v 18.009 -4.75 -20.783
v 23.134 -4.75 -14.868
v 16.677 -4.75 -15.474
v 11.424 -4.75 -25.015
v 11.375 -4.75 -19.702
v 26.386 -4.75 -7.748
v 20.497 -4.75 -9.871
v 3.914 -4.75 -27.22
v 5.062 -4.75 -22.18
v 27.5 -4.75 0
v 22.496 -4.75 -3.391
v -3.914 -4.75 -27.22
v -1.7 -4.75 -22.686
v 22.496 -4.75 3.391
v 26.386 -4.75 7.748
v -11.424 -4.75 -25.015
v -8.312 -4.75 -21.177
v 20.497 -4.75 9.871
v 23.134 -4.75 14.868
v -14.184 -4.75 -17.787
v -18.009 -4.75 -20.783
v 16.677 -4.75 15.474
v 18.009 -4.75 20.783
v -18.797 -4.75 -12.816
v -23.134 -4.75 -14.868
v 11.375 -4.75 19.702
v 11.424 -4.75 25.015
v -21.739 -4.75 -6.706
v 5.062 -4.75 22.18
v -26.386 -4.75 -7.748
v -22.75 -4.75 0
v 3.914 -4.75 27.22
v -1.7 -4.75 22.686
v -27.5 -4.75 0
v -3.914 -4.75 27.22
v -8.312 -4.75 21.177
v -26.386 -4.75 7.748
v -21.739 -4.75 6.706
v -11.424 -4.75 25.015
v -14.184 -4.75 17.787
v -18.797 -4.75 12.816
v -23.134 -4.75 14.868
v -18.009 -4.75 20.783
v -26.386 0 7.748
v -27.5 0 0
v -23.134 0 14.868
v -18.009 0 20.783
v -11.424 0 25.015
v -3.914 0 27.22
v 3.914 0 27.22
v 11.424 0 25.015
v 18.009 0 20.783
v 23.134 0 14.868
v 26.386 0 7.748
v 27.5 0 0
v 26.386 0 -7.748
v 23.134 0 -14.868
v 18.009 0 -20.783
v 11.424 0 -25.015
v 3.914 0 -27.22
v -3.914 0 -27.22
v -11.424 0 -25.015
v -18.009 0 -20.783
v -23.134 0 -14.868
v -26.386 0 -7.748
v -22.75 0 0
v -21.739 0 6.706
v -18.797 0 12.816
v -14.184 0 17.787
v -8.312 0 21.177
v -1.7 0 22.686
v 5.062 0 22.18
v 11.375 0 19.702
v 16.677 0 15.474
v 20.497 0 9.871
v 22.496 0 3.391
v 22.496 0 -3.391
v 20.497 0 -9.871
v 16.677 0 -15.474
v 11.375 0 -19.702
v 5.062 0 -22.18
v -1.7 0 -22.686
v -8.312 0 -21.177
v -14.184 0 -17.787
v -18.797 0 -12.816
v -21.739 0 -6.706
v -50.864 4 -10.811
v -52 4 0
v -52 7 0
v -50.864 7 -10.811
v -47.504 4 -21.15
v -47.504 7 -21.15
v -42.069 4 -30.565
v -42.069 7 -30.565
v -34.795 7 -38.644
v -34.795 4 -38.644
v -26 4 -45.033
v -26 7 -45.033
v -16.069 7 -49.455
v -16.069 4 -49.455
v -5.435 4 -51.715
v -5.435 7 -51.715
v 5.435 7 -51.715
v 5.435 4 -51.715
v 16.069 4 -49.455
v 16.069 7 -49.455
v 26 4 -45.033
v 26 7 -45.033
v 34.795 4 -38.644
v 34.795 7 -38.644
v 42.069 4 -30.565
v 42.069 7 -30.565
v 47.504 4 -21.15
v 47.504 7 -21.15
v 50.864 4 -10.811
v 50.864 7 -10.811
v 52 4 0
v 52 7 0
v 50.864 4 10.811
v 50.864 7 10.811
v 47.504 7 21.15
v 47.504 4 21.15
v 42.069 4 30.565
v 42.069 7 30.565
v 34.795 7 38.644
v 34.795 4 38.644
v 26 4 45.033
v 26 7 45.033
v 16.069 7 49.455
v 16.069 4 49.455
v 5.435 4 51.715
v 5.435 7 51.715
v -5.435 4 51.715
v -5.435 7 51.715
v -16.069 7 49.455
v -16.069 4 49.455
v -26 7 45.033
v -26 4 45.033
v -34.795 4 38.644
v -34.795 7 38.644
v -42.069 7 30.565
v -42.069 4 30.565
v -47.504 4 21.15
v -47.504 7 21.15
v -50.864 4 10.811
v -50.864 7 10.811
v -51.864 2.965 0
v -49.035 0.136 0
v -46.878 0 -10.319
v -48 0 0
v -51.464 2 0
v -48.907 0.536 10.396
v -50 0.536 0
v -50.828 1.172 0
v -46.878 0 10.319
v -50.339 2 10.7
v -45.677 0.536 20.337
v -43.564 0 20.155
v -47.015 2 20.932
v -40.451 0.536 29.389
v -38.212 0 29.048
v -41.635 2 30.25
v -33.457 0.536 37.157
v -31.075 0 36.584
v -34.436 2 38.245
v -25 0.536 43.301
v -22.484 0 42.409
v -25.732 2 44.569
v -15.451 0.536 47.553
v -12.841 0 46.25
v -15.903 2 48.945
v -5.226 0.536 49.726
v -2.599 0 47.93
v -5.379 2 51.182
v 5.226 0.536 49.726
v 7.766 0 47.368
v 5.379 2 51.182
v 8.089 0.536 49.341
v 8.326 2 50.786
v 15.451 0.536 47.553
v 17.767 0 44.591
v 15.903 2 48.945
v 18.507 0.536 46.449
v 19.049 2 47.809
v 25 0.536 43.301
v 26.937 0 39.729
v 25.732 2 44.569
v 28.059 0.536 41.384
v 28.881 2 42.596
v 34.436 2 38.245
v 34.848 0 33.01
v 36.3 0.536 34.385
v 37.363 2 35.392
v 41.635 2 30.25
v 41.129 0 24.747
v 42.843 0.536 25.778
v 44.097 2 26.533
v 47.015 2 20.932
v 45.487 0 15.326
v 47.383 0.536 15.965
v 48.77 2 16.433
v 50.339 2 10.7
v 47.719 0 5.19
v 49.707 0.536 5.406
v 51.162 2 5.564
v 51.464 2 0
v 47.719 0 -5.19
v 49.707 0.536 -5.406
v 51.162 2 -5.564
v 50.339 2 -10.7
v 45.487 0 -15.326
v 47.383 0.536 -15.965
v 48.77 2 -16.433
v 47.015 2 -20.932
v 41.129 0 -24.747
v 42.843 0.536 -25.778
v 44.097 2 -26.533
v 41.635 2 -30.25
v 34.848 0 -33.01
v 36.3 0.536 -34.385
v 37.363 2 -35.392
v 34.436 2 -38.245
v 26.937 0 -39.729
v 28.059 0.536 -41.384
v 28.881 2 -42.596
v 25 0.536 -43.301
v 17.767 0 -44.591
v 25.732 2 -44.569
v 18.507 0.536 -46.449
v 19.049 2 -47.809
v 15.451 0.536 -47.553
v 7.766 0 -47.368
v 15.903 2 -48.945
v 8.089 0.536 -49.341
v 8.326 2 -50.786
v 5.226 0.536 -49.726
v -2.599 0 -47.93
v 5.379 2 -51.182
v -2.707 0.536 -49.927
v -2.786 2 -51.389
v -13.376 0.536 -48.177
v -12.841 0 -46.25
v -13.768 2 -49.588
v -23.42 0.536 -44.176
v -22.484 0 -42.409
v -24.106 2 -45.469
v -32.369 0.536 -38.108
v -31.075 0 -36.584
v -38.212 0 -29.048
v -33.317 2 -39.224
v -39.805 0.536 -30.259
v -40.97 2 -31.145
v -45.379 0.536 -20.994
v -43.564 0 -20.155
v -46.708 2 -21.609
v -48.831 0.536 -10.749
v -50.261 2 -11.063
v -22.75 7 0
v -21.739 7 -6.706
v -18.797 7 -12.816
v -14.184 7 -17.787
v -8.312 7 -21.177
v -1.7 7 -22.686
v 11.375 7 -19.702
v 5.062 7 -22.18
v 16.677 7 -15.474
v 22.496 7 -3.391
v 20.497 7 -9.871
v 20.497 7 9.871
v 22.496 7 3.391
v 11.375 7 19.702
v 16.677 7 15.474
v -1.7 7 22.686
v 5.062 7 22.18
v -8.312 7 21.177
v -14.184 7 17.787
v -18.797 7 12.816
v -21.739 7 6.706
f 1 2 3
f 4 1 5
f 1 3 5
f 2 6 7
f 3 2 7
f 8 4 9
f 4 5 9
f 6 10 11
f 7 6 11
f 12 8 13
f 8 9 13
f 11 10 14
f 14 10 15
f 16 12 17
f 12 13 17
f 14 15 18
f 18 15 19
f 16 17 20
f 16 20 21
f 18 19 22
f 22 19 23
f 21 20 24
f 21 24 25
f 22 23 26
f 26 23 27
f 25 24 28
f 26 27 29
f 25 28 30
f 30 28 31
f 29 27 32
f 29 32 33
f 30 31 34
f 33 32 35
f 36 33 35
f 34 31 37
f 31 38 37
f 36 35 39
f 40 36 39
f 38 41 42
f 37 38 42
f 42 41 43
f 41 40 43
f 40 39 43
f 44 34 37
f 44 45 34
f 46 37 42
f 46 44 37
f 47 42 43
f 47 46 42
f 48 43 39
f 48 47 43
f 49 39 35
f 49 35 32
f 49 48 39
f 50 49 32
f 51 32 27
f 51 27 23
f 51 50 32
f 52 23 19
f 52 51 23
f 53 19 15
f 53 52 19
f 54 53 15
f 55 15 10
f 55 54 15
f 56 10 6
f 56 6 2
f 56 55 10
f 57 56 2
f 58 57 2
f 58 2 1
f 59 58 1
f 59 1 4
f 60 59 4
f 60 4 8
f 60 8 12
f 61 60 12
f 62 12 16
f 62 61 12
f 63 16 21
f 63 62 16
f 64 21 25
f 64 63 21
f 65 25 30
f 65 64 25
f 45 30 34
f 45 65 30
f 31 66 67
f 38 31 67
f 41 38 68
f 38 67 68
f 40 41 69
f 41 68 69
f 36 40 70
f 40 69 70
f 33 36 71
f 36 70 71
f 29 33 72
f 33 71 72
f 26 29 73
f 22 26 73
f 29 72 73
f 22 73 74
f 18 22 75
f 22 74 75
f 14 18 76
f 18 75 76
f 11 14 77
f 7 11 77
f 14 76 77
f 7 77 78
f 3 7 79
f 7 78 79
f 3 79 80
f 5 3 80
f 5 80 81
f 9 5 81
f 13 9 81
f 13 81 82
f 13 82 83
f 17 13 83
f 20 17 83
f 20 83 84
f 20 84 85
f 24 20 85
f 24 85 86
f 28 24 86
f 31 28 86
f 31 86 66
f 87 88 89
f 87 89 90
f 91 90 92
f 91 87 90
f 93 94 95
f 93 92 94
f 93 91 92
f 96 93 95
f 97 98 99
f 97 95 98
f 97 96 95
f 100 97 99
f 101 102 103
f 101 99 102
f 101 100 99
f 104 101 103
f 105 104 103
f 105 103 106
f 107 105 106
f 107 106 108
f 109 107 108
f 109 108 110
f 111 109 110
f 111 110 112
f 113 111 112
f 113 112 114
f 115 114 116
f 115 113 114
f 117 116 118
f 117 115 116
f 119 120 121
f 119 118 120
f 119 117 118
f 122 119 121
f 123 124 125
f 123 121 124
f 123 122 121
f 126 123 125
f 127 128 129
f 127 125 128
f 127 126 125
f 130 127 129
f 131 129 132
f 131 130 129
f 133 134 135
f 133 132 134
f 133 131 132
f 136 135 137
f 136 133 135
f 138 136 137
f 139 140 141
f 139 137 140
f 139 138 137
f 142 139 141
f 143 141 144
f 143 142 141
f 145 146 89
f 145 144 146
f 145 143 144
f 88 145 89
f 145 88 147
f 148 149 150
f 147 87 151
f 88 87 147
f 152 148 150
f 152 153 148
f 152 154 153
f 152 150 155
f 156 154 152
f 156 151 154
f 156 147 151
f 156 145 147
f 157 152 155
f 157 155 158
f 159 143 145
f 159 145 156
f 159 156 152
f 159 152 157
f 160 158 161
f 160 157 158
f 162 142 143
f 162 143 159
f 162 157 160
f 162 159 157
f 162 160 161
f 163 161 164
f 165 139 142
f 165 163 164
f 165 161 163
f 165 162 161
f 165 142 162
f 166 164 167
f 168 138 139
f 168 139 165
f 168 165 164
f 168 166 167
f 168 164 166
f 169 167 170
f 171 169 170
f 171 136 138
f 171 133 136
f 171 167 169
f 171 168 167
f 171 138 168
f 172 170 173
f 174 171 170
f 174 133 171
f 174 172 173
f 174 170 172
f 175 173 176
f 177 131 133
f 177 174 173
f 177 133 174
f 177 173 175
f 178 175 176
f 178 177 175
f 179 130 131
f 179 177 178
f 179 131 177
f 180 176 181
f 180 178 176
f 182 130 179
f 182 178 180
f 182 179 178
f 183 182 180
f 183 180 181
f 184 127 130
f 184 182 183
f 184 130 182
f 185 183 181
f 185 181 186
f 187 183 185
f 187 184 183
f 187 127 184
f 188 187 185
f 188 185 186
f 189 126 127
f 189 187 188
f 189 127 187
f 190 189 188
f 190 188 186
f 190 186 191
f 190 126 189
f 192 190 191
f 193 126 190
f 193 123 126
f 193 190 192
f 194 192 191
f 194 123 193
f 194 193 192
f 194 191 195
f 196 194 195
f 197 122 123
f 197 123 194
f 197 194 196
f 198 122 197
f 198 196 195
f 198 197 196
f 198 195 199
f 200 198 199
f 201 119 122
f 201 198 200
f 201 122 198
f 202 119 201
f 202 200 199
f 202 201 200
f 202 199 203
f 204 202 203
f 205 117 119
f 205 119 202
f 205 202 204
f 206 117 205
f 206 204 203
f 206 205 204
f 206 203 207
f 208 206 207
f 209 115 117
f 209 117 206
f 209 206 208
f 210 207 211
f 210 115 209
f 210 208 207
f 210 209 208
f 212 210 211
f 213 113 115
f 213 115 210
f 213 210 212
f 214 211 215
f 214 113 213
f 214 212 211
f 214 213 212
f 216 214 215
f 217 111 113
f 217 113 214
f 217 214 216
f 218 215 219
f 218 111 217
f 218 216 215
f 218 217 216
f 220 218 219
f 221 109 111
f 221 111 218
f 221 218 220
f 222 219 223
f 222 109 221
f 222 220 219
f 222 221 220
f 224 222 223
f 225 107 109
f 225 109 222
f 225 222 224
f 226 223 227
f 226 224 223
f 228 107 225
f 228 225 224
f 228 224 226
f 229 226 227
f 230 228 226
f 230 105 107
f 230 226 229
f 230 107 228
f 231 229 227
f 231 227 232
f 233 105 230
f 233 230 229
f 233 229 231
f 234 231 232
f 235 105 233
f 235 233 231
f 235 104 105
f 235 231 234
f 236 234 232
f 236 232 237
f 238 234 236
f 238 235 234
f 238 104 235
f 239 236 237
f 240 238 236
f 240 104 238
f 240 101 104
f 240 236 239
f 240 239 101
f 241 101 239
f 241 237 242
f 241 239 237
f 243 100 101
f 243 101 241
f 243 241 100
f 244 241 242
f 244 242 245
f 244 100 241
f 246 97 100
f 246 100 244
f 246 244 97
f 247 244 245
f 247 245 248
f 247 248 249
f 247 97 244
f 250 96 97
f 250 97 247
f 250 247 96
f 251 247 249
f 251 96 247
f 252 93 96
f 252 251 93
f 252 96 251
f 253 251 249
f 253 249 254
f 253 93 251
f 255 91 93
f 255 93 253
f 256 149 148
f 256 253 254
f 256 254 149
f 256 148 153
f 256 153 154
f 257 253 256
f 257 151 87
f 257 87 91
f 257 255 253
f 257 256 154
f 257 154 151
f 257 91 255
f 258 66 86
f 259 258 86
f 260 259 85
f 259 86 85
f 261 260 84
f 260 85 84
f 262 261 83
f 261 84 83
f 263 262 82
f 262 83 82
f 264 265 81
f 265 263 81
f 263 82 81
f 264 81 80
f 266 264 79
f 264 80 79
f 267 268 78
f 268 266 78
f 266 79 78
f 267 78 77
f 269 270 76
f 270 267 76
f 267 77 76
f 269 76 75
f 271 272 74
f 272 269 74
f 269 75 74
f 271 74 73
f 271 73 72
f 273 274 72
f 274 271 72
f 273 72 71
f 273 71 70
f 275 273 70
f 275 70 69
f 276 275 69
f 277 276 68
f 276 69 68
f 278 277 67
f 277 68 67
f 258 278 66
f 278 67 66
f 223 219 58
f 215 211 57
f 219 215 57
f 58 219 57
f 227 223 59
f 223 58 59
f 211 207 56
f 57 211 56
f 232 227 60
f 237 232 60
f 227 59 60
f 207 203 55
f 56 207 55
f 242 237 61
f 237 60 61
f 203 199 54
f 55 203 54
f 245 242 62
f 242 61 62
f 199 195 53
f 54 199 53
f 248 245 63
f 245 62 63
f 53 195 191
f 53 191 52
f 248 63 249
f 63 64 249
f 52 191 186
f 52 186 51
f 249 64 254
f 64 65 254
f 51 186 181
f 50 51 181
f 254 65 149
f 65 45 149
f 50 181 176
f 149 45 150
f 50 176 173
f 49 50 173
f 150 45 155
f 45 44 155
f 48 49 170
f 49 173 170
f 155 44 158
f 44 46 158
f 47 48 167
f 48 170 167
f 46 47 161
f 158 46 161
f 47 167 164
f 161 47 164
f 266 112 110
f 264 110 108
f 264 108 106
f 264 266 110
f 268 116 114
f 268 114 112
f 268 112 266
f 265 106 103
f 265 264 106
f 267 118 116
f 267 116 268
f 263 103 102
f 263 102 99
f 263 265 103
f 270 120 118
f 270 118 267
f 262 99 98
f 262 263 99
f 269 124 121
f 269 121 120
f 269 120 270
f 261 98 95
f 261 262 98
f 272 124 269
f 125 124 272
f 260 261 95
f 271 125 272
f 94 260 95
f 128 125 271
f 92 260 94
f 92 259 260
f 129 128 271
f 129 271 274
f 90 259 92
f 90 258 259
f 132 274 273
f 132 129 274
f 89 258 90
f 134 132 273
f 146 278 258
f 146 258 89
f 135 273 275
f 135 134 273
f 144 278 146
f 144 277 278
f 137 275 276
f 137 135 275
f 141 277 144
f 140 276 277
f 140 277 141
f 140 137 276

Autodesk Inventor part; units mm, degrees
ref_plane "YZ Plane" through (0, 0, 0) normal (1, 0, 0) x (0, 1, 0)
ref_plane "XZ Plane" through (0, 0, 0) normal (0, 1, 0) x (-1, 0, 0)
ref_plane "XY Plane" through (0, 0, 0) normal (0, 0, 1) x (1, 0, 0)
sketch "Sketch1" plane through (0, 0, 0) normal (0, 1, 0) x (-1, 0, 0)
  circle A0 centre (0, 0) radius 52
  circle A1 centre (0, 0) radius 22.75
  circle A2 centre (0, 0) radius 27.5
  dimension "d2" = 45.5
  dimension "d4" = 55
extrude "Extrusion1" add sketch "Sketch1" against normal blind 4.75 contours A2
extrude "Extrusion2" add sketch "Sketch1" along normal blind 7 contours A0 | A2
fillet "Fillet1" radius 4 1 edges at (52, 0, 0)
properties part number "wheel_chain_guide_holes"
